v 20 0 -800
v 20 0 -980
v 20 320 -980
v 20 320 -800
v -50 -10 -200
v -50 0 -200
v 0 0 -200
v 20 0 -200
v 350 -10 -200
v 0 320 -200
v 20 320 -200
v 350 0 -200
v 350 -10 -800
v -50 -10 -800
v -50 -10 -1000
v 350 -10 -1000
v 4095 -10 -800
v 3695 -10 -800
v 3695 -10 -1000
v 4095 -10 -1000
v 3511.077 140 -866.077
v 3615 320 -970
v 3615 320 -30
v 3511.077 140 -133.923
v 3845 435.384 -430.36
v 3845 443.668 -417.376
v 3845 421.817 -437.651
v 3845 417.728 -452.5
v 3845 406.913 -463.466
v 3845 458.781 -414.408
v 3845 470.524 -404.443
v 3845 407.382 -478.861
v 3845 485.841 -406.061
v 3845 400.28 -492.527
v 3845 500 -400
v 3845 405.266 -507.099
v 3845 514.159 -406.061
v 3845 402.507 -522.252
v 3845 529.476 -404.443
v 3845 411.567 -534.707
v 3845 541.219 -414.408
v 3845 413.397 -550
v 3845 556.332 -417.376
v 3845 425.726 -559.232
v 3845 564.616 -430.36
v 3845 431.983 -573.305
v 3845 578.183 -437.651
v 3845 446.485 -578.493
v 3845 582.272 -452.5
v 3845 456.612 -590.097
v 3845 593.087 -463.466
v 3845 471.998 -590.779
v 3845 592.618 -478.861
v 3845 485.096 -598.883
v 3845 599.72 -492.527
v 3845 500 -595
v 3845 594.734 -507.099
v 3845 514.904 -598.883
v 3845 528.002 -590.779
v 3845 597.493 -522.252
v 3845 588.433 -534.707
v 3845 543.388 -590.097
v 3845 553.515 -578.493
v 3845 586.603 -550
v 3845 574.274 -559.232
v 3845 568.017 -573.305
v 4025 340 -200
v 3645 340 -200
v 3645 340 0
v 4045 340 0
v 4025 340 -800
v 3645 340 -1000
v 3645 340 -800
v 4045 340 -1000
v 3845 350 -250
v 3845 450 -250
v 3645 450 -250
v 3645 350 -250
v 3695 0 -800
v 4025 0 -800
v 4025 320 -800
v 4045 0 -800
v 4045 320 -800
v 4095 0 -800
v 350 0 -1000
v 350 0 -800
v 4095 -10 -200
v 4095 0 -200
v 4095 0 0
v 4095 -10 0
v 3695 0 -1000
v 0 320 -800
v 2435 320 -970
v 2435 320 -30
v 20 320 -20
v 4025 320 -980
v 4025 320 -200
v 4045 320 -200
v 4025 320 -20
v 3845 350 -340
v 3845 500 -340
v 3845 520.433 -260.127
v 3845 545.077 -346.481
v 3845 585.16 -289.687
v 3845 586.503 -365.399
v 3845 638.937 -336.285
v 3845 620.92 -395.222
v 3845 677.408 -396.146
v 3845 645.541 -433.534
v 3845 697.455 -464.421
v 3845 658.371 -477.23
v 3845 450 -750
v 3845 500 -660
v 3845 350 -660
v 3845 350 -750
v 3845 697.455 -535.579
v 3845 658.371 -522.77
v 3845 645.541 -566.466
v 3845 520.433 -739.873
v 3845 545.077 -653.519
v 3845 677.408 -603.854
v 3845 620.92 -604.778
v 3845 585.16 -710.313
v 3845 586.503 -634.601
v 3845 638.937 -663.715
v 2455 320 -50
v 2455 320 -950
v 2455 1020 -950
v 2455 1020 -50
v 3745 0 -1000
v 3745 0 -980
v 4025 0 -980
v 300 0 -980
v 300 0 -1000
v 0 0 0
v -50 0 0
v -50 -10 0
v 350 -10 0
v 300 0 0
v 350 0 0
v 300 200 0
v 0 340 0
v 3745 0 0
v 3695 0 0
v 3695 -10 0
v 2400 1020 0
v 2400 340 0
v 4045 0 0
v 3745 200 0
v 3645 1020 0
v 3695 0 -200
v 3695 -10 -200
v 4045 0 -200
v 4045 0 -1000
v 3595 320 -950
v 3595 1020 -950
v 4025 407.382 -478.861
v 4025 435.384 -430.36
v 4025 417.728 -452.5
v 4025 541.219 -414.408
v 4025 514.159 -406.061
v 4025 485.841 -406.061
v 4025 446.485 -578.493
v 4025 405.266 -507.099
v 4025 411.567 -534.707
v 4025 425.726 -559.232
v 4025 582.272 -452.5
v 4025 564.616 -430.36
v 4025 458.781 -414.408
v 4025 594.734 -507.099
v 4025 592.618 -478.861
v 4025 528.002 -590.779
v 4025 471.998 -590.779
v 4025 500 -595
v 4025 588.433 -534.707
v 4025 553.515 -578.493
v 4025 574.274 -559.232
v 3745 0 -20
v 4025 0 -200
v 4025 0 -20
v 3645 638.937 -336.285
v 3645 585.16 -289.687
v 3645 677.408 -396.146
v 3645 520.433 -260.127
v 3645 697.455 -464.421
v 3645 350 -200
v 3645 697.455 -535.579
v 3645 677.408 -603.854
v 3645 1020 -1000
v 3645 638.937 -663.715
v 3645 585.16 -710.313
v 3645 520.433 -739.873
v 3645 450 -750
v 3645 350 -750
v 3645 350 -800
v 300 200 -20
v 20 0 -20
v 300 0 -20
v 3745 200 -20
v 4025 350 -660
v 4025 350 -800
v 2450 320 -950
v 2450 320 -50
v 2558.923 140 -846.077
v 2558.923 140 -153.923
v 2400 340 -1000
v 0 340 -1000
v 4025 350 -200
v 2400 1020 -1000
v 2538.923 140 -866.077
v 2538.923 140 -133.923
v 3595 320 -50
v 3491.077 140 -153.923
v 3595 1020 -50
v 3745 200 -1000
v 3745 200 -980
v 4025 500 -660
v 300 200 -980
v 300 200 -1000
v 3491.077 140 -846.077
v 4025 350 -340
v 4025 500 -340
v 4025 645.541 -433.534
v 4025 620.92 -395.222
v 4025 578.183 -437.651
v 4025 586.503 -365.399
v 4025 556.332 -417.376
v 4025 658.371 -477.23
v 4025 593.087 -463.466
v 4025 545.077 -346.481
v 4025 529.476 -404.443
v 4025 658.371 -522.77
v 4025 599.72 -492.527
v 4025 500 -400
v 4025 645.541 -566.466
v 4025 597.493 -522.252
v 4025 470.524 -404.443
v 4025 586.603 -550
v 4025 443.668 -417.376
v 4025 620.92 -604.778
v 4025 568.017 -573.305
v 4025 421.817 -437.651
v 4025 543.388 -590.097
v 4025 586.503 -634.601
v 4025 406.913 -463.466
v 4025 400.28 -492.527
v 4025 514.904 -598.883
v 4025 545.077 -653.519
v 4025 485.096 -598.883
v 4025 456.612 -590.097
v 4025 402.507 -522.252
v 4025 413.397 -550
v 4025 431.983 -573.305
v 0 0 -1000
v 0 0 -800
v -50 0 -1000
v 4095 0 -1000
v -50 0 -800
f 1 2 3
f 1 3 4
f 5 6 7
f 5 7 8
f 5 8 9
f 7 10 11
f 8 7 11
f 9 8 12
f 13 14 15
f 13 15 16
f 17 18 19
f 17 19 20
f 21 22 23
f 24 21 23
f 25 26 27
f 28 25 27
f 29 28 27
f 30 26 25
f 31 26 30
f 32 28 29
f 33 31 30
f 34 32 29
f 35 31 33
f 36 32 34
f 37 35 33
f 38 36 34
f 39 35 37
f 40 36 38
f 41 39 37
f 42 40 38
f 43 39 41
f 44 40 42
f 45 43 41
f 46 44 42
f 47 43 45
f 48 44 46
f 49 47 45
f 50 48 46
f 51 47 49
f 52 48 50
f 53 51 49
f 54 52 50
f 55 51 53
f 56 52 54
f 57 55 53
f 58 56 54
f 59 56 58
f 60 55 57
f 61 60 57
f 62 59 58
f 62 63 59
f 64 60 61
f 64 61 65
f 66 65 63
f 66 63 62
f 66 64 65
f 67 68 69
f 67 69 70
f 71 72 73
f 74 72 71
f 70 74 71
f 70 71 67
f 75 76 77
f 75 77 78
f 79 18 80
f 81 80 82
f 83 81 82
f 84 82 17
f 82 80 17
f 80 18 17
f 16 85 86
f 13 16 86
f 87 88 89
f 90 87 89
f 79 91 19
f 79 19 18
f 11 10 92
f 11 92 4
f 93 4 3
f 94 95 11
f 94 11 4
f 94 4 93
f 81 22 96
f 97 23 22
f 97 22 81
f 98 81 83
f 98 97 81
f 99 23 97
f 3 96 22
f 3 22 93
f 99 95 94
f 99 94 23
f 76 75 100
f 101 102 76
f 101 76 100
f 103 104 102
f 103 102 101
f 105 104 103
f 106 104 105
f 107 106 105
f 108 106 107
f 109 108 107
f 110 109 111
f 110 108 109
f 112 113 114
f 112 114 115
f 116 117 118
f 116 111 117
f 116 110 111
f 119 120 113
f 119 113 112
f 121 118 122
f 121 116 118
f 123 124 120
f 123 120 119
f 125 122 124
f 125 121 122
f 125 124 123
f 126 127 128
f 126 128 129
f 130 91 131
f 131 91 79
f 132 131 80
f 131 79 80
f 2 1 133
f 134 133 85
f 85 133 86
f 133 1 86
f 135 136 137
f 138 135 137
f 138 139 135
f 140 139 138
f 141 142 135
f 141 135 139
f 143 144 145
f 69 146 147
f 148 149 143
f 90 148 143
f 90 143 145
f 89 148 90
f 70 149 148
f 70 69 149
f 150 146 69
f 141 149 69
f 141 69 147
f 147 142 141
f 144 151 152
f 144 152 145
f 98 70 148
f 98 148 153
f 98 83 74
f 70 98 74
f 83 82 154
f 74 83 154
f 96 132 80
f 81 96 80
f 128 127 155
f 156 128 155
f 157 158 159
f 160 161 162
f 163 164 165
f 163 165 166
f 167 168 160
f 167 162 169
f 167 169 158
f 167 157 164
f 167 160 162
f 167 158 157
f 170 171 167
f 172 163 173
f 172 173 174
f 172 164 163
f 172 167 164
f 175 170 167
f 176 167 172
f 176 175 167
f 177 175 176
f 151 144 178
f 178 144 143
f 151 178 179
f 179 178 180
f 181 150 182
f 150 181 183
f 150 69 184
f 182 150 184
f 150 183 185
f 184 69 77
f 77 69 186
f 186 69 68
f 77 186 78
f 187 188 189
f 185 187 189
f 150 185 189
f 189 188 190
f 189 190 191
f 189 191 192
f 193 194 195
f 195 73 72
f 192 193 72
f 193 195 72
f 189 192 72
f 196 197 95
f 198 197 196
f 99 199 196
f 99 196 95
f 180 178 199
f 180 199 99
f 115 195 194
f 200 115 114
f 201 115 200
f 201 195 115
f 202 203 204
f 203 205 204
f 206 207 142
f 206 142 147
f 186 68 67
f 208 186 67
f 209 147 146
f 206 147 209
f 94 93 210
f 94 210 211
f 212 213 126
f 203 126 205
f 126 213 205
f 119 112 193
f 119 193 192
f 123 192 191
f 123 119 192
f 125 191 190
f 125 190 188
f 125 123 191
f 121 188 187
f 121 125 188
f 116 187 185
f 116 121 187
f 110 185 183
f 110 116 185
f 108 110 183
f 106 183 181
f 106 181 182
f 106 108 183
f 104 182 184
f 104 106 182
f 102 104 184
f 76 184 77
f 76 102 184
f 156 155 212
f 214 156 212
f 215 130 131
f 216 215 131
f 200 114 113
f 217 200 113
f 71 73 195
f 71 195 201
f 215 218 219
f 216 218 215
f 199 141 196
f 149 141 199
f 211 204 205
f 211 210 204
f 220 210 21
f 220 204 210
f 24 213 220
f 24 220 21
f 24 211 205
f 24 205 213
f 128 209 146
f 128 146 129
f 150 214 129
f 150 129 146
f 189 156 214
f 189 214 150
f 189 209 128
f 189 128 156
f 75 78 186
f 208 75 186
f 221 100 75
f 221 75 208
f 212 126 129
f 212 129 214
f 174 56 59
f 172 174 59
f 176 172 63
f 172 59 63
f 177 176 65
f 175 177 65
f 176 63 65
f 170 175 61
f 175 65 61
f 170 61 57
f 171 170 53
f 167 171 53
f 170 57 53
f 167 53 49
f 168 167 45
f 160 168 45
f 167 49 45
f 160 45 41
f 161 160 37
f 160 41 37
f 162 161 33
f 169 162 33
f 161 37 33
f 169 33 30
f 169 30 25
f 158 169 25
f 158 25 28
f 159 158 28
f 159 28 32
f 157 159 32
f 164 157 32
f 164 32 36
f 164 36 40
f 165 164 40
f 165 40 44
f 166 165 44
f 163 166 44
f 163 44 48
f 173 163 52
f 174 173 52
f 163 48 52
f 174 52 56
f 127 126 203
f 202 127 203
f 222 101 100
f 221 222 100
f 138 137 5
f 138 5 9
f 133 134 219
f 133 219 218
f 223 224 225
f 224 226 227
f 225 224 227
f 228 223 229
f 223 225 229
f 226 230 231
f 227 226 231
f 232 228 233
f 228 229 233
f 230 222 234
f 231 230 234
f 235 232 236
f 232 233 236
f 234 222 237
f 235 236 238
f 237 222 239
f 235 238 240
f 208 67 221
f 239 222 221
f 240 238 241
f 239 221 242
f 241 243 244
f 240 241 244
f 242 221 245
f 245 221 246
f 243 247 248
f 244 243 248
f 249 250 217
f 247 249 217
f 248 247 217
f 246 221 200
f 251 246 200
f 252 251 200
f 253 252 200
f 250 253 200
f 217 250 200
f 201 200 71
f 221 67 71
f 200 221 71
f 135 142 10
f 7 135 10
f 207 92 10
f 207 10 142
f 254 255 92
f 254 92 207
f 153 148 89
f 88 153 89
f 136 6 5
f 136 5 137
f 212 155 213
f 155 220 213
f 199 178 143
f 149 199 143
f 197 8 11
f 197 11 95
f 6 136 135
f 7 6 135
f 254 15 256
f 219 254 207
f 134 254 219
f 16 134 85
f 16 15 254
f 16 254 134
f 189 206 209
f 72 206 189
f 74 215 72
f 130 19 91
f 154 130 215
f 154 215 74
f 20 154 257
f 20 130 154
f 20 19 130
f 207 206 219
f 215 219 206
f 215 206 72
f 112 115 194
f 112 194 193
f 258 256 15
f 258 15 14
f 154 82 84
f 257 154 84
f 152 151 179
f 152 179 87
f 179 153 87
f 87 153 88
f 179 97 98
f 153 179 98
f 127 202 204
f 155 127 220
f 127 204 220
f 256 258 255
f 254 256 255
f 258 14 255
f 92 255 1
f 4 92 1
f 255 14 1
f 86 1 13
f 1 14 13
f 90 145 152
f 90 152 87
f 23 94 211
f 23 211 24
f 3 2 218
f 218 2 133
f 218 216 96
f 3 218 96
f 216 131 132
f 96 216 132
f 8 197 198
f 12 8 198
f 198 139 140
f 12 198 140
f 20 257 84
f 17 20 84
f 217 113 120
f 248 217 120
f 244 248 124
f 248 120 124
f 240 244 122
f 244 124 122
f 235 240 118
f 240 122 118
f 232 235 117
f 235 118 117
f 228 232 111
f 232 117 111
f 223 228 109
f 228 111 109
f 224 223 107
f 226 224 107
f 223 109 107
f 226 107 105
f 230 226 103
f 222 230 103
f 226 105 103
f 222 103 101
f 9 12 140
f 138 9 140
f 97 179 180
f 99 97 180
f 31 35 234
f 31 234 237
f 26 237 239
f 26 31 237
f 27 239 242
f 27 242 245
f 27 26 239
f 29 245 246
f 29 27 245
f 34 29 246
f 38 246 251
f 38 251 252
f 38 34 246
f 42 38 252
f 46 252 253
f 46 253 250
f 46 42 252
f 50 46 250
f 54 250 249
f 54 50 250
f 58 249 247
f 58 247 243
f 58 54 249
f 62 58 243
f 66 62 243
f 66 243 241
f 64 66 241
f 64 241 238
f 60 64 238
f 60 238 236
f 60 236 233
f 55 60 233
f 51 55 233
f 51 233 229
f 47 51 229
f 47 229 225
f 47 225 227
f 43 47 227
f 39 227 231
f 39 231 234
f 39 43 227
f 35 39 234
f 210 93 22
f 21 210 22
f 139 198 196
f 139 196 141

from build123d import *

# Parameters (mm, degrees)
SKETCH1_W           = 4045
SKETCH1_H           = 1000
BOSS_EXTRUDE1_DEPTH = 340
SKETCH2_W           = 4045
SKETCH2_H           = 600
CUT_EXTRUDE1_DEPTH  = 320
SKETCH3_W           = 3445
SKETCH3_H           = 200
CUT_EXTRUDE2_DEPTH  = 200
SKETCH4_W           = 400
SKETCH4_H           = 200
BOSS_EXTRUDE2_DEPTH = 10
SKETCH5_W           = 1245
SKETCH5_H           = 1000
BOSS_EXTRUDE3_DEPTH = 680
CUT_EXTRUDE3_START  = -10
SKETCH6_W           = 4005
SKETCH6_H           = 960
CUT_EXTRUDE3_DEPTH  = 320
SKETCH7_W           = 1140
SKETCH7_H           = 900
CUT_EXTRUDE5_DEPTH  = 4274.058038454
SKETCH7_3_W         = 1180
SKETCH7_3_H         = 940
BOSS_EXTRUDE4_DEPTH = 180
DRAFT3_ANGLE        = -30
BOSS_EXTRUDE5_REACH = 4150.665
SKETCH13_R          = 100
BOSS_EXTRUDE6_DEPTH = 180
SKETCH14_W          = 380
SKETCH14_H          = 600
BOSS_EXTRUDE7_DEPTH = 10
SKETCH15_R          = 95
BOSS_EXTRUDE8_DEPTH = 180


with BuildPart() as part:
    # Sketch1 → Boss-Extrude1 (new body)
    with BuildSketch(Plane(origin=(0, 0, 0), x_dir=(1, 0, 0), z_dir=(0, 1, 0))):
        with Locations((2022.5, 500)):
            Rectangle(SKETCH1_W, SKETCH1_H)
    extrude(amount=BOSS_EXTRUDE1_DEPTH)

    # Sketch2 → Cut-Extrude1 (cut)
    with BuildSketch(Plane.XZ):
        with Locations((2022.5, -500)):
            Rectangle(SKETCH2_W, SKETCH2_H)
    extrude(amount=-CUT_EXTRUDE1_DEPTH, mode=Mode.SUBTRACT)

    # Sketch3 → Cut-Extrude2 (cut)
    with BuildSketch(Plane.XZ):
        with Locations((2022.5, -100)):
            Rectangle(SKETCH3_W, SKETCH3_H)
        with Locations((2022.5, -900)):
            Rectangle(SKETCH3_W, SKETCH3_H)
    extrude(amount=-CUT_EXTRUDE2_DEPTH, mode=Mode.SUBTRACT)

    # Sketch4 → Boss-Extrude2 (add)
    with BuildSketch(Plane.XZ):
        with Locations((150, -100)):
            Rectangle(SKETCH4_W, SKETCH4_H)
        with Locations((3895, -100)):
            Rectangle(SKETCH4_W, SKETCH4_H)
        with Locations((3895, -900)):
            Rectangle(SKETCH4_W, SKETCH4_H)
        with Locations((150, -900)):
            Rectangle(SKETCH4_W, SKETCH4_H)
    extrude(amount=BOSS_EXTRUDE2_DEPTH)

    # Sketch5 → Boss-Extrude3 (add)
    with BuildSketch(Plane(origin=(0, 340, 0), x_dir=(1, 0, 0), z_dir=(0, 1, 0))):
        with Locations((3022.5, 500)):
            Rectangle(SKETCH5_W, SKETCH5_H)
    extrude(amount=BOSS_EXTRUDE3_DEPTH)

    # Sketch6 → Cut-Extrude3 (cut)
    with BuildSketch(Plane.XZ.offset(10).offset(CUT_EXTRUDE3_START)):
        with Locations((2022.5, -500)):
            Rectangle(SKETCH6_W, SKETCH6_H)
    extrude(amount=-CUT_EXTRUDE3_DEPTH, mode=Mode.SUBTRACT)

    # Sketch7 → Cut-Extrude5 (cut, through all)
    with BuildSketch(Plane.XZ.offset(-320)):
        with Locations((3025, -500)):
            Rectangle(SKETCH7_W, SKETCH7_H)
    extrude(amount=-CUT_EXTRUDE5_DEPTH, mode=Mode.SUBTRACT)

    # Sketch7<3> → Boss-Extrude4 (add)
    with BuildSketch(Plane.XZ.offset(-320)):
        with Locations((3025, -500)):
            Rectangle(SKETCH7_3_W, SKETCH7_3_H)
    extrude(amount=BOSS_EXTRUDE4_DEPTH)

    # Draft3
    draft3_faces = [part.faces().sort_by_distance(p)[0] for p in [
        (3025, 230, -30),
        (3615, 230, -500),
        (3025, 230, -970),
        (2435, 230, -500),
    ]]
    draft(draft3_faces, Plane.ZX.offset(320), DRAFT3_ANGLE)

    # Sketch8 → Cut-Loft2 section 0
    with BuildSketch(Plane(origin=(0, 320, 0), x_dir=(1, 0, 0), z_dir=(0, 1, 0))):
        with BuildLine():
            Line((3595, 50), (2450, 50))
            Line((2450, 50), (2450, 950))
            Line((2450, 950), (3595, 950))
            Line((3595, 950), (3595, 50))
        make_face()
    # Sketch10 → Cut-Loft2 section 1
    with BuildSketch(Plane.XZ.offset(-140)):
        with BuildLine():
            Line((2558.923048454, -153.923048454), (3491.076951546, -153.923048454))
            Line((3491.076951546, -153.923048454), (3491.076951546, -846.076951546))
            Line((3491.076951546, -846.076951546), (2558.923048454, -846.076951546))
            Line((2558.923048454, -846.076951546), (2558.923048454, -153.923048454))
        make_face()
    loft(mode=Mode.SUBTRACT)

    # Sketch12 → Boss-Extrude5 (add, up to next)
    with BuildSketch(Plane(origin=(3845, 0, 0), x_dir=(0, 0, -1), z_dir=(1, 0, 0)), mode=Mode.PRIVATE) as boss_extrude5_sk1:
        with BuildLine():
            Line((250, 450), (250, 350))
            Line((250, 350), (750, 350))
            Line((750, 350), (750, 450))
            ThreePointArc((750, 450), (500, 700), (250, 450))
        make_face()
    boss_extrude5_tool1 = extrude(boss_extrude5_sk1.sketch, amount=-BOSS_EXTRUDE5_REACH, mode=Mode.PRIVATE) - part.part
    add(boss_extrude5_tool1.solids().sort_by_distance((3845, 503.427899, -500))[0])

    # Sketch13 → Boss-Extrude6 (add)
    with BuildSketch(Plane(origin=(3845, 0, 0), x_dir=(0, 0, -1), z_dir=(1, 0, 0))):
        with BuildLine():
            Line((340, 500), (340, 340))
            Line((340, 340), (660, 340))
            Line((660, 340), (660, 500))
            ThreePointArc((660, 500), (500, 660), (340, 500))
        make_face()
        with Locations(Location((500, 500, 0), (0, 0, 180))):
            Circle(SKETCH13_R, mode=Mode.SUBTRACT)
    extrude(amount=BOSS_EXTRUDE6_DEPTH)

    # Sketch14 → Boss-Extrude7 (add)
    with BuildSketch(Plane(origin=(0, 340, 0), x_dir=(1, 0, 0), z_dir=(0, 1, 0))):
        with Locations((3835, 500)):
            Rectangle(SKETCH14_W, SKETCH14_H)
    extrude(amount=BOSS_EXTRUDE7_DEPTH)

    # Sketch15 → Boss-Extrude8 (add)
    with BuildSketch(Plane(origin=(3845, 0, 0), x_dir=(0, 0, -1), z_dir=(1, 0, 0))):
        with Locations((500, 500)):
            Circle(SKETCH15_R)
    extrude(amount=BOSS_EXTRUDE8_DEPTH)


solid = part.part
